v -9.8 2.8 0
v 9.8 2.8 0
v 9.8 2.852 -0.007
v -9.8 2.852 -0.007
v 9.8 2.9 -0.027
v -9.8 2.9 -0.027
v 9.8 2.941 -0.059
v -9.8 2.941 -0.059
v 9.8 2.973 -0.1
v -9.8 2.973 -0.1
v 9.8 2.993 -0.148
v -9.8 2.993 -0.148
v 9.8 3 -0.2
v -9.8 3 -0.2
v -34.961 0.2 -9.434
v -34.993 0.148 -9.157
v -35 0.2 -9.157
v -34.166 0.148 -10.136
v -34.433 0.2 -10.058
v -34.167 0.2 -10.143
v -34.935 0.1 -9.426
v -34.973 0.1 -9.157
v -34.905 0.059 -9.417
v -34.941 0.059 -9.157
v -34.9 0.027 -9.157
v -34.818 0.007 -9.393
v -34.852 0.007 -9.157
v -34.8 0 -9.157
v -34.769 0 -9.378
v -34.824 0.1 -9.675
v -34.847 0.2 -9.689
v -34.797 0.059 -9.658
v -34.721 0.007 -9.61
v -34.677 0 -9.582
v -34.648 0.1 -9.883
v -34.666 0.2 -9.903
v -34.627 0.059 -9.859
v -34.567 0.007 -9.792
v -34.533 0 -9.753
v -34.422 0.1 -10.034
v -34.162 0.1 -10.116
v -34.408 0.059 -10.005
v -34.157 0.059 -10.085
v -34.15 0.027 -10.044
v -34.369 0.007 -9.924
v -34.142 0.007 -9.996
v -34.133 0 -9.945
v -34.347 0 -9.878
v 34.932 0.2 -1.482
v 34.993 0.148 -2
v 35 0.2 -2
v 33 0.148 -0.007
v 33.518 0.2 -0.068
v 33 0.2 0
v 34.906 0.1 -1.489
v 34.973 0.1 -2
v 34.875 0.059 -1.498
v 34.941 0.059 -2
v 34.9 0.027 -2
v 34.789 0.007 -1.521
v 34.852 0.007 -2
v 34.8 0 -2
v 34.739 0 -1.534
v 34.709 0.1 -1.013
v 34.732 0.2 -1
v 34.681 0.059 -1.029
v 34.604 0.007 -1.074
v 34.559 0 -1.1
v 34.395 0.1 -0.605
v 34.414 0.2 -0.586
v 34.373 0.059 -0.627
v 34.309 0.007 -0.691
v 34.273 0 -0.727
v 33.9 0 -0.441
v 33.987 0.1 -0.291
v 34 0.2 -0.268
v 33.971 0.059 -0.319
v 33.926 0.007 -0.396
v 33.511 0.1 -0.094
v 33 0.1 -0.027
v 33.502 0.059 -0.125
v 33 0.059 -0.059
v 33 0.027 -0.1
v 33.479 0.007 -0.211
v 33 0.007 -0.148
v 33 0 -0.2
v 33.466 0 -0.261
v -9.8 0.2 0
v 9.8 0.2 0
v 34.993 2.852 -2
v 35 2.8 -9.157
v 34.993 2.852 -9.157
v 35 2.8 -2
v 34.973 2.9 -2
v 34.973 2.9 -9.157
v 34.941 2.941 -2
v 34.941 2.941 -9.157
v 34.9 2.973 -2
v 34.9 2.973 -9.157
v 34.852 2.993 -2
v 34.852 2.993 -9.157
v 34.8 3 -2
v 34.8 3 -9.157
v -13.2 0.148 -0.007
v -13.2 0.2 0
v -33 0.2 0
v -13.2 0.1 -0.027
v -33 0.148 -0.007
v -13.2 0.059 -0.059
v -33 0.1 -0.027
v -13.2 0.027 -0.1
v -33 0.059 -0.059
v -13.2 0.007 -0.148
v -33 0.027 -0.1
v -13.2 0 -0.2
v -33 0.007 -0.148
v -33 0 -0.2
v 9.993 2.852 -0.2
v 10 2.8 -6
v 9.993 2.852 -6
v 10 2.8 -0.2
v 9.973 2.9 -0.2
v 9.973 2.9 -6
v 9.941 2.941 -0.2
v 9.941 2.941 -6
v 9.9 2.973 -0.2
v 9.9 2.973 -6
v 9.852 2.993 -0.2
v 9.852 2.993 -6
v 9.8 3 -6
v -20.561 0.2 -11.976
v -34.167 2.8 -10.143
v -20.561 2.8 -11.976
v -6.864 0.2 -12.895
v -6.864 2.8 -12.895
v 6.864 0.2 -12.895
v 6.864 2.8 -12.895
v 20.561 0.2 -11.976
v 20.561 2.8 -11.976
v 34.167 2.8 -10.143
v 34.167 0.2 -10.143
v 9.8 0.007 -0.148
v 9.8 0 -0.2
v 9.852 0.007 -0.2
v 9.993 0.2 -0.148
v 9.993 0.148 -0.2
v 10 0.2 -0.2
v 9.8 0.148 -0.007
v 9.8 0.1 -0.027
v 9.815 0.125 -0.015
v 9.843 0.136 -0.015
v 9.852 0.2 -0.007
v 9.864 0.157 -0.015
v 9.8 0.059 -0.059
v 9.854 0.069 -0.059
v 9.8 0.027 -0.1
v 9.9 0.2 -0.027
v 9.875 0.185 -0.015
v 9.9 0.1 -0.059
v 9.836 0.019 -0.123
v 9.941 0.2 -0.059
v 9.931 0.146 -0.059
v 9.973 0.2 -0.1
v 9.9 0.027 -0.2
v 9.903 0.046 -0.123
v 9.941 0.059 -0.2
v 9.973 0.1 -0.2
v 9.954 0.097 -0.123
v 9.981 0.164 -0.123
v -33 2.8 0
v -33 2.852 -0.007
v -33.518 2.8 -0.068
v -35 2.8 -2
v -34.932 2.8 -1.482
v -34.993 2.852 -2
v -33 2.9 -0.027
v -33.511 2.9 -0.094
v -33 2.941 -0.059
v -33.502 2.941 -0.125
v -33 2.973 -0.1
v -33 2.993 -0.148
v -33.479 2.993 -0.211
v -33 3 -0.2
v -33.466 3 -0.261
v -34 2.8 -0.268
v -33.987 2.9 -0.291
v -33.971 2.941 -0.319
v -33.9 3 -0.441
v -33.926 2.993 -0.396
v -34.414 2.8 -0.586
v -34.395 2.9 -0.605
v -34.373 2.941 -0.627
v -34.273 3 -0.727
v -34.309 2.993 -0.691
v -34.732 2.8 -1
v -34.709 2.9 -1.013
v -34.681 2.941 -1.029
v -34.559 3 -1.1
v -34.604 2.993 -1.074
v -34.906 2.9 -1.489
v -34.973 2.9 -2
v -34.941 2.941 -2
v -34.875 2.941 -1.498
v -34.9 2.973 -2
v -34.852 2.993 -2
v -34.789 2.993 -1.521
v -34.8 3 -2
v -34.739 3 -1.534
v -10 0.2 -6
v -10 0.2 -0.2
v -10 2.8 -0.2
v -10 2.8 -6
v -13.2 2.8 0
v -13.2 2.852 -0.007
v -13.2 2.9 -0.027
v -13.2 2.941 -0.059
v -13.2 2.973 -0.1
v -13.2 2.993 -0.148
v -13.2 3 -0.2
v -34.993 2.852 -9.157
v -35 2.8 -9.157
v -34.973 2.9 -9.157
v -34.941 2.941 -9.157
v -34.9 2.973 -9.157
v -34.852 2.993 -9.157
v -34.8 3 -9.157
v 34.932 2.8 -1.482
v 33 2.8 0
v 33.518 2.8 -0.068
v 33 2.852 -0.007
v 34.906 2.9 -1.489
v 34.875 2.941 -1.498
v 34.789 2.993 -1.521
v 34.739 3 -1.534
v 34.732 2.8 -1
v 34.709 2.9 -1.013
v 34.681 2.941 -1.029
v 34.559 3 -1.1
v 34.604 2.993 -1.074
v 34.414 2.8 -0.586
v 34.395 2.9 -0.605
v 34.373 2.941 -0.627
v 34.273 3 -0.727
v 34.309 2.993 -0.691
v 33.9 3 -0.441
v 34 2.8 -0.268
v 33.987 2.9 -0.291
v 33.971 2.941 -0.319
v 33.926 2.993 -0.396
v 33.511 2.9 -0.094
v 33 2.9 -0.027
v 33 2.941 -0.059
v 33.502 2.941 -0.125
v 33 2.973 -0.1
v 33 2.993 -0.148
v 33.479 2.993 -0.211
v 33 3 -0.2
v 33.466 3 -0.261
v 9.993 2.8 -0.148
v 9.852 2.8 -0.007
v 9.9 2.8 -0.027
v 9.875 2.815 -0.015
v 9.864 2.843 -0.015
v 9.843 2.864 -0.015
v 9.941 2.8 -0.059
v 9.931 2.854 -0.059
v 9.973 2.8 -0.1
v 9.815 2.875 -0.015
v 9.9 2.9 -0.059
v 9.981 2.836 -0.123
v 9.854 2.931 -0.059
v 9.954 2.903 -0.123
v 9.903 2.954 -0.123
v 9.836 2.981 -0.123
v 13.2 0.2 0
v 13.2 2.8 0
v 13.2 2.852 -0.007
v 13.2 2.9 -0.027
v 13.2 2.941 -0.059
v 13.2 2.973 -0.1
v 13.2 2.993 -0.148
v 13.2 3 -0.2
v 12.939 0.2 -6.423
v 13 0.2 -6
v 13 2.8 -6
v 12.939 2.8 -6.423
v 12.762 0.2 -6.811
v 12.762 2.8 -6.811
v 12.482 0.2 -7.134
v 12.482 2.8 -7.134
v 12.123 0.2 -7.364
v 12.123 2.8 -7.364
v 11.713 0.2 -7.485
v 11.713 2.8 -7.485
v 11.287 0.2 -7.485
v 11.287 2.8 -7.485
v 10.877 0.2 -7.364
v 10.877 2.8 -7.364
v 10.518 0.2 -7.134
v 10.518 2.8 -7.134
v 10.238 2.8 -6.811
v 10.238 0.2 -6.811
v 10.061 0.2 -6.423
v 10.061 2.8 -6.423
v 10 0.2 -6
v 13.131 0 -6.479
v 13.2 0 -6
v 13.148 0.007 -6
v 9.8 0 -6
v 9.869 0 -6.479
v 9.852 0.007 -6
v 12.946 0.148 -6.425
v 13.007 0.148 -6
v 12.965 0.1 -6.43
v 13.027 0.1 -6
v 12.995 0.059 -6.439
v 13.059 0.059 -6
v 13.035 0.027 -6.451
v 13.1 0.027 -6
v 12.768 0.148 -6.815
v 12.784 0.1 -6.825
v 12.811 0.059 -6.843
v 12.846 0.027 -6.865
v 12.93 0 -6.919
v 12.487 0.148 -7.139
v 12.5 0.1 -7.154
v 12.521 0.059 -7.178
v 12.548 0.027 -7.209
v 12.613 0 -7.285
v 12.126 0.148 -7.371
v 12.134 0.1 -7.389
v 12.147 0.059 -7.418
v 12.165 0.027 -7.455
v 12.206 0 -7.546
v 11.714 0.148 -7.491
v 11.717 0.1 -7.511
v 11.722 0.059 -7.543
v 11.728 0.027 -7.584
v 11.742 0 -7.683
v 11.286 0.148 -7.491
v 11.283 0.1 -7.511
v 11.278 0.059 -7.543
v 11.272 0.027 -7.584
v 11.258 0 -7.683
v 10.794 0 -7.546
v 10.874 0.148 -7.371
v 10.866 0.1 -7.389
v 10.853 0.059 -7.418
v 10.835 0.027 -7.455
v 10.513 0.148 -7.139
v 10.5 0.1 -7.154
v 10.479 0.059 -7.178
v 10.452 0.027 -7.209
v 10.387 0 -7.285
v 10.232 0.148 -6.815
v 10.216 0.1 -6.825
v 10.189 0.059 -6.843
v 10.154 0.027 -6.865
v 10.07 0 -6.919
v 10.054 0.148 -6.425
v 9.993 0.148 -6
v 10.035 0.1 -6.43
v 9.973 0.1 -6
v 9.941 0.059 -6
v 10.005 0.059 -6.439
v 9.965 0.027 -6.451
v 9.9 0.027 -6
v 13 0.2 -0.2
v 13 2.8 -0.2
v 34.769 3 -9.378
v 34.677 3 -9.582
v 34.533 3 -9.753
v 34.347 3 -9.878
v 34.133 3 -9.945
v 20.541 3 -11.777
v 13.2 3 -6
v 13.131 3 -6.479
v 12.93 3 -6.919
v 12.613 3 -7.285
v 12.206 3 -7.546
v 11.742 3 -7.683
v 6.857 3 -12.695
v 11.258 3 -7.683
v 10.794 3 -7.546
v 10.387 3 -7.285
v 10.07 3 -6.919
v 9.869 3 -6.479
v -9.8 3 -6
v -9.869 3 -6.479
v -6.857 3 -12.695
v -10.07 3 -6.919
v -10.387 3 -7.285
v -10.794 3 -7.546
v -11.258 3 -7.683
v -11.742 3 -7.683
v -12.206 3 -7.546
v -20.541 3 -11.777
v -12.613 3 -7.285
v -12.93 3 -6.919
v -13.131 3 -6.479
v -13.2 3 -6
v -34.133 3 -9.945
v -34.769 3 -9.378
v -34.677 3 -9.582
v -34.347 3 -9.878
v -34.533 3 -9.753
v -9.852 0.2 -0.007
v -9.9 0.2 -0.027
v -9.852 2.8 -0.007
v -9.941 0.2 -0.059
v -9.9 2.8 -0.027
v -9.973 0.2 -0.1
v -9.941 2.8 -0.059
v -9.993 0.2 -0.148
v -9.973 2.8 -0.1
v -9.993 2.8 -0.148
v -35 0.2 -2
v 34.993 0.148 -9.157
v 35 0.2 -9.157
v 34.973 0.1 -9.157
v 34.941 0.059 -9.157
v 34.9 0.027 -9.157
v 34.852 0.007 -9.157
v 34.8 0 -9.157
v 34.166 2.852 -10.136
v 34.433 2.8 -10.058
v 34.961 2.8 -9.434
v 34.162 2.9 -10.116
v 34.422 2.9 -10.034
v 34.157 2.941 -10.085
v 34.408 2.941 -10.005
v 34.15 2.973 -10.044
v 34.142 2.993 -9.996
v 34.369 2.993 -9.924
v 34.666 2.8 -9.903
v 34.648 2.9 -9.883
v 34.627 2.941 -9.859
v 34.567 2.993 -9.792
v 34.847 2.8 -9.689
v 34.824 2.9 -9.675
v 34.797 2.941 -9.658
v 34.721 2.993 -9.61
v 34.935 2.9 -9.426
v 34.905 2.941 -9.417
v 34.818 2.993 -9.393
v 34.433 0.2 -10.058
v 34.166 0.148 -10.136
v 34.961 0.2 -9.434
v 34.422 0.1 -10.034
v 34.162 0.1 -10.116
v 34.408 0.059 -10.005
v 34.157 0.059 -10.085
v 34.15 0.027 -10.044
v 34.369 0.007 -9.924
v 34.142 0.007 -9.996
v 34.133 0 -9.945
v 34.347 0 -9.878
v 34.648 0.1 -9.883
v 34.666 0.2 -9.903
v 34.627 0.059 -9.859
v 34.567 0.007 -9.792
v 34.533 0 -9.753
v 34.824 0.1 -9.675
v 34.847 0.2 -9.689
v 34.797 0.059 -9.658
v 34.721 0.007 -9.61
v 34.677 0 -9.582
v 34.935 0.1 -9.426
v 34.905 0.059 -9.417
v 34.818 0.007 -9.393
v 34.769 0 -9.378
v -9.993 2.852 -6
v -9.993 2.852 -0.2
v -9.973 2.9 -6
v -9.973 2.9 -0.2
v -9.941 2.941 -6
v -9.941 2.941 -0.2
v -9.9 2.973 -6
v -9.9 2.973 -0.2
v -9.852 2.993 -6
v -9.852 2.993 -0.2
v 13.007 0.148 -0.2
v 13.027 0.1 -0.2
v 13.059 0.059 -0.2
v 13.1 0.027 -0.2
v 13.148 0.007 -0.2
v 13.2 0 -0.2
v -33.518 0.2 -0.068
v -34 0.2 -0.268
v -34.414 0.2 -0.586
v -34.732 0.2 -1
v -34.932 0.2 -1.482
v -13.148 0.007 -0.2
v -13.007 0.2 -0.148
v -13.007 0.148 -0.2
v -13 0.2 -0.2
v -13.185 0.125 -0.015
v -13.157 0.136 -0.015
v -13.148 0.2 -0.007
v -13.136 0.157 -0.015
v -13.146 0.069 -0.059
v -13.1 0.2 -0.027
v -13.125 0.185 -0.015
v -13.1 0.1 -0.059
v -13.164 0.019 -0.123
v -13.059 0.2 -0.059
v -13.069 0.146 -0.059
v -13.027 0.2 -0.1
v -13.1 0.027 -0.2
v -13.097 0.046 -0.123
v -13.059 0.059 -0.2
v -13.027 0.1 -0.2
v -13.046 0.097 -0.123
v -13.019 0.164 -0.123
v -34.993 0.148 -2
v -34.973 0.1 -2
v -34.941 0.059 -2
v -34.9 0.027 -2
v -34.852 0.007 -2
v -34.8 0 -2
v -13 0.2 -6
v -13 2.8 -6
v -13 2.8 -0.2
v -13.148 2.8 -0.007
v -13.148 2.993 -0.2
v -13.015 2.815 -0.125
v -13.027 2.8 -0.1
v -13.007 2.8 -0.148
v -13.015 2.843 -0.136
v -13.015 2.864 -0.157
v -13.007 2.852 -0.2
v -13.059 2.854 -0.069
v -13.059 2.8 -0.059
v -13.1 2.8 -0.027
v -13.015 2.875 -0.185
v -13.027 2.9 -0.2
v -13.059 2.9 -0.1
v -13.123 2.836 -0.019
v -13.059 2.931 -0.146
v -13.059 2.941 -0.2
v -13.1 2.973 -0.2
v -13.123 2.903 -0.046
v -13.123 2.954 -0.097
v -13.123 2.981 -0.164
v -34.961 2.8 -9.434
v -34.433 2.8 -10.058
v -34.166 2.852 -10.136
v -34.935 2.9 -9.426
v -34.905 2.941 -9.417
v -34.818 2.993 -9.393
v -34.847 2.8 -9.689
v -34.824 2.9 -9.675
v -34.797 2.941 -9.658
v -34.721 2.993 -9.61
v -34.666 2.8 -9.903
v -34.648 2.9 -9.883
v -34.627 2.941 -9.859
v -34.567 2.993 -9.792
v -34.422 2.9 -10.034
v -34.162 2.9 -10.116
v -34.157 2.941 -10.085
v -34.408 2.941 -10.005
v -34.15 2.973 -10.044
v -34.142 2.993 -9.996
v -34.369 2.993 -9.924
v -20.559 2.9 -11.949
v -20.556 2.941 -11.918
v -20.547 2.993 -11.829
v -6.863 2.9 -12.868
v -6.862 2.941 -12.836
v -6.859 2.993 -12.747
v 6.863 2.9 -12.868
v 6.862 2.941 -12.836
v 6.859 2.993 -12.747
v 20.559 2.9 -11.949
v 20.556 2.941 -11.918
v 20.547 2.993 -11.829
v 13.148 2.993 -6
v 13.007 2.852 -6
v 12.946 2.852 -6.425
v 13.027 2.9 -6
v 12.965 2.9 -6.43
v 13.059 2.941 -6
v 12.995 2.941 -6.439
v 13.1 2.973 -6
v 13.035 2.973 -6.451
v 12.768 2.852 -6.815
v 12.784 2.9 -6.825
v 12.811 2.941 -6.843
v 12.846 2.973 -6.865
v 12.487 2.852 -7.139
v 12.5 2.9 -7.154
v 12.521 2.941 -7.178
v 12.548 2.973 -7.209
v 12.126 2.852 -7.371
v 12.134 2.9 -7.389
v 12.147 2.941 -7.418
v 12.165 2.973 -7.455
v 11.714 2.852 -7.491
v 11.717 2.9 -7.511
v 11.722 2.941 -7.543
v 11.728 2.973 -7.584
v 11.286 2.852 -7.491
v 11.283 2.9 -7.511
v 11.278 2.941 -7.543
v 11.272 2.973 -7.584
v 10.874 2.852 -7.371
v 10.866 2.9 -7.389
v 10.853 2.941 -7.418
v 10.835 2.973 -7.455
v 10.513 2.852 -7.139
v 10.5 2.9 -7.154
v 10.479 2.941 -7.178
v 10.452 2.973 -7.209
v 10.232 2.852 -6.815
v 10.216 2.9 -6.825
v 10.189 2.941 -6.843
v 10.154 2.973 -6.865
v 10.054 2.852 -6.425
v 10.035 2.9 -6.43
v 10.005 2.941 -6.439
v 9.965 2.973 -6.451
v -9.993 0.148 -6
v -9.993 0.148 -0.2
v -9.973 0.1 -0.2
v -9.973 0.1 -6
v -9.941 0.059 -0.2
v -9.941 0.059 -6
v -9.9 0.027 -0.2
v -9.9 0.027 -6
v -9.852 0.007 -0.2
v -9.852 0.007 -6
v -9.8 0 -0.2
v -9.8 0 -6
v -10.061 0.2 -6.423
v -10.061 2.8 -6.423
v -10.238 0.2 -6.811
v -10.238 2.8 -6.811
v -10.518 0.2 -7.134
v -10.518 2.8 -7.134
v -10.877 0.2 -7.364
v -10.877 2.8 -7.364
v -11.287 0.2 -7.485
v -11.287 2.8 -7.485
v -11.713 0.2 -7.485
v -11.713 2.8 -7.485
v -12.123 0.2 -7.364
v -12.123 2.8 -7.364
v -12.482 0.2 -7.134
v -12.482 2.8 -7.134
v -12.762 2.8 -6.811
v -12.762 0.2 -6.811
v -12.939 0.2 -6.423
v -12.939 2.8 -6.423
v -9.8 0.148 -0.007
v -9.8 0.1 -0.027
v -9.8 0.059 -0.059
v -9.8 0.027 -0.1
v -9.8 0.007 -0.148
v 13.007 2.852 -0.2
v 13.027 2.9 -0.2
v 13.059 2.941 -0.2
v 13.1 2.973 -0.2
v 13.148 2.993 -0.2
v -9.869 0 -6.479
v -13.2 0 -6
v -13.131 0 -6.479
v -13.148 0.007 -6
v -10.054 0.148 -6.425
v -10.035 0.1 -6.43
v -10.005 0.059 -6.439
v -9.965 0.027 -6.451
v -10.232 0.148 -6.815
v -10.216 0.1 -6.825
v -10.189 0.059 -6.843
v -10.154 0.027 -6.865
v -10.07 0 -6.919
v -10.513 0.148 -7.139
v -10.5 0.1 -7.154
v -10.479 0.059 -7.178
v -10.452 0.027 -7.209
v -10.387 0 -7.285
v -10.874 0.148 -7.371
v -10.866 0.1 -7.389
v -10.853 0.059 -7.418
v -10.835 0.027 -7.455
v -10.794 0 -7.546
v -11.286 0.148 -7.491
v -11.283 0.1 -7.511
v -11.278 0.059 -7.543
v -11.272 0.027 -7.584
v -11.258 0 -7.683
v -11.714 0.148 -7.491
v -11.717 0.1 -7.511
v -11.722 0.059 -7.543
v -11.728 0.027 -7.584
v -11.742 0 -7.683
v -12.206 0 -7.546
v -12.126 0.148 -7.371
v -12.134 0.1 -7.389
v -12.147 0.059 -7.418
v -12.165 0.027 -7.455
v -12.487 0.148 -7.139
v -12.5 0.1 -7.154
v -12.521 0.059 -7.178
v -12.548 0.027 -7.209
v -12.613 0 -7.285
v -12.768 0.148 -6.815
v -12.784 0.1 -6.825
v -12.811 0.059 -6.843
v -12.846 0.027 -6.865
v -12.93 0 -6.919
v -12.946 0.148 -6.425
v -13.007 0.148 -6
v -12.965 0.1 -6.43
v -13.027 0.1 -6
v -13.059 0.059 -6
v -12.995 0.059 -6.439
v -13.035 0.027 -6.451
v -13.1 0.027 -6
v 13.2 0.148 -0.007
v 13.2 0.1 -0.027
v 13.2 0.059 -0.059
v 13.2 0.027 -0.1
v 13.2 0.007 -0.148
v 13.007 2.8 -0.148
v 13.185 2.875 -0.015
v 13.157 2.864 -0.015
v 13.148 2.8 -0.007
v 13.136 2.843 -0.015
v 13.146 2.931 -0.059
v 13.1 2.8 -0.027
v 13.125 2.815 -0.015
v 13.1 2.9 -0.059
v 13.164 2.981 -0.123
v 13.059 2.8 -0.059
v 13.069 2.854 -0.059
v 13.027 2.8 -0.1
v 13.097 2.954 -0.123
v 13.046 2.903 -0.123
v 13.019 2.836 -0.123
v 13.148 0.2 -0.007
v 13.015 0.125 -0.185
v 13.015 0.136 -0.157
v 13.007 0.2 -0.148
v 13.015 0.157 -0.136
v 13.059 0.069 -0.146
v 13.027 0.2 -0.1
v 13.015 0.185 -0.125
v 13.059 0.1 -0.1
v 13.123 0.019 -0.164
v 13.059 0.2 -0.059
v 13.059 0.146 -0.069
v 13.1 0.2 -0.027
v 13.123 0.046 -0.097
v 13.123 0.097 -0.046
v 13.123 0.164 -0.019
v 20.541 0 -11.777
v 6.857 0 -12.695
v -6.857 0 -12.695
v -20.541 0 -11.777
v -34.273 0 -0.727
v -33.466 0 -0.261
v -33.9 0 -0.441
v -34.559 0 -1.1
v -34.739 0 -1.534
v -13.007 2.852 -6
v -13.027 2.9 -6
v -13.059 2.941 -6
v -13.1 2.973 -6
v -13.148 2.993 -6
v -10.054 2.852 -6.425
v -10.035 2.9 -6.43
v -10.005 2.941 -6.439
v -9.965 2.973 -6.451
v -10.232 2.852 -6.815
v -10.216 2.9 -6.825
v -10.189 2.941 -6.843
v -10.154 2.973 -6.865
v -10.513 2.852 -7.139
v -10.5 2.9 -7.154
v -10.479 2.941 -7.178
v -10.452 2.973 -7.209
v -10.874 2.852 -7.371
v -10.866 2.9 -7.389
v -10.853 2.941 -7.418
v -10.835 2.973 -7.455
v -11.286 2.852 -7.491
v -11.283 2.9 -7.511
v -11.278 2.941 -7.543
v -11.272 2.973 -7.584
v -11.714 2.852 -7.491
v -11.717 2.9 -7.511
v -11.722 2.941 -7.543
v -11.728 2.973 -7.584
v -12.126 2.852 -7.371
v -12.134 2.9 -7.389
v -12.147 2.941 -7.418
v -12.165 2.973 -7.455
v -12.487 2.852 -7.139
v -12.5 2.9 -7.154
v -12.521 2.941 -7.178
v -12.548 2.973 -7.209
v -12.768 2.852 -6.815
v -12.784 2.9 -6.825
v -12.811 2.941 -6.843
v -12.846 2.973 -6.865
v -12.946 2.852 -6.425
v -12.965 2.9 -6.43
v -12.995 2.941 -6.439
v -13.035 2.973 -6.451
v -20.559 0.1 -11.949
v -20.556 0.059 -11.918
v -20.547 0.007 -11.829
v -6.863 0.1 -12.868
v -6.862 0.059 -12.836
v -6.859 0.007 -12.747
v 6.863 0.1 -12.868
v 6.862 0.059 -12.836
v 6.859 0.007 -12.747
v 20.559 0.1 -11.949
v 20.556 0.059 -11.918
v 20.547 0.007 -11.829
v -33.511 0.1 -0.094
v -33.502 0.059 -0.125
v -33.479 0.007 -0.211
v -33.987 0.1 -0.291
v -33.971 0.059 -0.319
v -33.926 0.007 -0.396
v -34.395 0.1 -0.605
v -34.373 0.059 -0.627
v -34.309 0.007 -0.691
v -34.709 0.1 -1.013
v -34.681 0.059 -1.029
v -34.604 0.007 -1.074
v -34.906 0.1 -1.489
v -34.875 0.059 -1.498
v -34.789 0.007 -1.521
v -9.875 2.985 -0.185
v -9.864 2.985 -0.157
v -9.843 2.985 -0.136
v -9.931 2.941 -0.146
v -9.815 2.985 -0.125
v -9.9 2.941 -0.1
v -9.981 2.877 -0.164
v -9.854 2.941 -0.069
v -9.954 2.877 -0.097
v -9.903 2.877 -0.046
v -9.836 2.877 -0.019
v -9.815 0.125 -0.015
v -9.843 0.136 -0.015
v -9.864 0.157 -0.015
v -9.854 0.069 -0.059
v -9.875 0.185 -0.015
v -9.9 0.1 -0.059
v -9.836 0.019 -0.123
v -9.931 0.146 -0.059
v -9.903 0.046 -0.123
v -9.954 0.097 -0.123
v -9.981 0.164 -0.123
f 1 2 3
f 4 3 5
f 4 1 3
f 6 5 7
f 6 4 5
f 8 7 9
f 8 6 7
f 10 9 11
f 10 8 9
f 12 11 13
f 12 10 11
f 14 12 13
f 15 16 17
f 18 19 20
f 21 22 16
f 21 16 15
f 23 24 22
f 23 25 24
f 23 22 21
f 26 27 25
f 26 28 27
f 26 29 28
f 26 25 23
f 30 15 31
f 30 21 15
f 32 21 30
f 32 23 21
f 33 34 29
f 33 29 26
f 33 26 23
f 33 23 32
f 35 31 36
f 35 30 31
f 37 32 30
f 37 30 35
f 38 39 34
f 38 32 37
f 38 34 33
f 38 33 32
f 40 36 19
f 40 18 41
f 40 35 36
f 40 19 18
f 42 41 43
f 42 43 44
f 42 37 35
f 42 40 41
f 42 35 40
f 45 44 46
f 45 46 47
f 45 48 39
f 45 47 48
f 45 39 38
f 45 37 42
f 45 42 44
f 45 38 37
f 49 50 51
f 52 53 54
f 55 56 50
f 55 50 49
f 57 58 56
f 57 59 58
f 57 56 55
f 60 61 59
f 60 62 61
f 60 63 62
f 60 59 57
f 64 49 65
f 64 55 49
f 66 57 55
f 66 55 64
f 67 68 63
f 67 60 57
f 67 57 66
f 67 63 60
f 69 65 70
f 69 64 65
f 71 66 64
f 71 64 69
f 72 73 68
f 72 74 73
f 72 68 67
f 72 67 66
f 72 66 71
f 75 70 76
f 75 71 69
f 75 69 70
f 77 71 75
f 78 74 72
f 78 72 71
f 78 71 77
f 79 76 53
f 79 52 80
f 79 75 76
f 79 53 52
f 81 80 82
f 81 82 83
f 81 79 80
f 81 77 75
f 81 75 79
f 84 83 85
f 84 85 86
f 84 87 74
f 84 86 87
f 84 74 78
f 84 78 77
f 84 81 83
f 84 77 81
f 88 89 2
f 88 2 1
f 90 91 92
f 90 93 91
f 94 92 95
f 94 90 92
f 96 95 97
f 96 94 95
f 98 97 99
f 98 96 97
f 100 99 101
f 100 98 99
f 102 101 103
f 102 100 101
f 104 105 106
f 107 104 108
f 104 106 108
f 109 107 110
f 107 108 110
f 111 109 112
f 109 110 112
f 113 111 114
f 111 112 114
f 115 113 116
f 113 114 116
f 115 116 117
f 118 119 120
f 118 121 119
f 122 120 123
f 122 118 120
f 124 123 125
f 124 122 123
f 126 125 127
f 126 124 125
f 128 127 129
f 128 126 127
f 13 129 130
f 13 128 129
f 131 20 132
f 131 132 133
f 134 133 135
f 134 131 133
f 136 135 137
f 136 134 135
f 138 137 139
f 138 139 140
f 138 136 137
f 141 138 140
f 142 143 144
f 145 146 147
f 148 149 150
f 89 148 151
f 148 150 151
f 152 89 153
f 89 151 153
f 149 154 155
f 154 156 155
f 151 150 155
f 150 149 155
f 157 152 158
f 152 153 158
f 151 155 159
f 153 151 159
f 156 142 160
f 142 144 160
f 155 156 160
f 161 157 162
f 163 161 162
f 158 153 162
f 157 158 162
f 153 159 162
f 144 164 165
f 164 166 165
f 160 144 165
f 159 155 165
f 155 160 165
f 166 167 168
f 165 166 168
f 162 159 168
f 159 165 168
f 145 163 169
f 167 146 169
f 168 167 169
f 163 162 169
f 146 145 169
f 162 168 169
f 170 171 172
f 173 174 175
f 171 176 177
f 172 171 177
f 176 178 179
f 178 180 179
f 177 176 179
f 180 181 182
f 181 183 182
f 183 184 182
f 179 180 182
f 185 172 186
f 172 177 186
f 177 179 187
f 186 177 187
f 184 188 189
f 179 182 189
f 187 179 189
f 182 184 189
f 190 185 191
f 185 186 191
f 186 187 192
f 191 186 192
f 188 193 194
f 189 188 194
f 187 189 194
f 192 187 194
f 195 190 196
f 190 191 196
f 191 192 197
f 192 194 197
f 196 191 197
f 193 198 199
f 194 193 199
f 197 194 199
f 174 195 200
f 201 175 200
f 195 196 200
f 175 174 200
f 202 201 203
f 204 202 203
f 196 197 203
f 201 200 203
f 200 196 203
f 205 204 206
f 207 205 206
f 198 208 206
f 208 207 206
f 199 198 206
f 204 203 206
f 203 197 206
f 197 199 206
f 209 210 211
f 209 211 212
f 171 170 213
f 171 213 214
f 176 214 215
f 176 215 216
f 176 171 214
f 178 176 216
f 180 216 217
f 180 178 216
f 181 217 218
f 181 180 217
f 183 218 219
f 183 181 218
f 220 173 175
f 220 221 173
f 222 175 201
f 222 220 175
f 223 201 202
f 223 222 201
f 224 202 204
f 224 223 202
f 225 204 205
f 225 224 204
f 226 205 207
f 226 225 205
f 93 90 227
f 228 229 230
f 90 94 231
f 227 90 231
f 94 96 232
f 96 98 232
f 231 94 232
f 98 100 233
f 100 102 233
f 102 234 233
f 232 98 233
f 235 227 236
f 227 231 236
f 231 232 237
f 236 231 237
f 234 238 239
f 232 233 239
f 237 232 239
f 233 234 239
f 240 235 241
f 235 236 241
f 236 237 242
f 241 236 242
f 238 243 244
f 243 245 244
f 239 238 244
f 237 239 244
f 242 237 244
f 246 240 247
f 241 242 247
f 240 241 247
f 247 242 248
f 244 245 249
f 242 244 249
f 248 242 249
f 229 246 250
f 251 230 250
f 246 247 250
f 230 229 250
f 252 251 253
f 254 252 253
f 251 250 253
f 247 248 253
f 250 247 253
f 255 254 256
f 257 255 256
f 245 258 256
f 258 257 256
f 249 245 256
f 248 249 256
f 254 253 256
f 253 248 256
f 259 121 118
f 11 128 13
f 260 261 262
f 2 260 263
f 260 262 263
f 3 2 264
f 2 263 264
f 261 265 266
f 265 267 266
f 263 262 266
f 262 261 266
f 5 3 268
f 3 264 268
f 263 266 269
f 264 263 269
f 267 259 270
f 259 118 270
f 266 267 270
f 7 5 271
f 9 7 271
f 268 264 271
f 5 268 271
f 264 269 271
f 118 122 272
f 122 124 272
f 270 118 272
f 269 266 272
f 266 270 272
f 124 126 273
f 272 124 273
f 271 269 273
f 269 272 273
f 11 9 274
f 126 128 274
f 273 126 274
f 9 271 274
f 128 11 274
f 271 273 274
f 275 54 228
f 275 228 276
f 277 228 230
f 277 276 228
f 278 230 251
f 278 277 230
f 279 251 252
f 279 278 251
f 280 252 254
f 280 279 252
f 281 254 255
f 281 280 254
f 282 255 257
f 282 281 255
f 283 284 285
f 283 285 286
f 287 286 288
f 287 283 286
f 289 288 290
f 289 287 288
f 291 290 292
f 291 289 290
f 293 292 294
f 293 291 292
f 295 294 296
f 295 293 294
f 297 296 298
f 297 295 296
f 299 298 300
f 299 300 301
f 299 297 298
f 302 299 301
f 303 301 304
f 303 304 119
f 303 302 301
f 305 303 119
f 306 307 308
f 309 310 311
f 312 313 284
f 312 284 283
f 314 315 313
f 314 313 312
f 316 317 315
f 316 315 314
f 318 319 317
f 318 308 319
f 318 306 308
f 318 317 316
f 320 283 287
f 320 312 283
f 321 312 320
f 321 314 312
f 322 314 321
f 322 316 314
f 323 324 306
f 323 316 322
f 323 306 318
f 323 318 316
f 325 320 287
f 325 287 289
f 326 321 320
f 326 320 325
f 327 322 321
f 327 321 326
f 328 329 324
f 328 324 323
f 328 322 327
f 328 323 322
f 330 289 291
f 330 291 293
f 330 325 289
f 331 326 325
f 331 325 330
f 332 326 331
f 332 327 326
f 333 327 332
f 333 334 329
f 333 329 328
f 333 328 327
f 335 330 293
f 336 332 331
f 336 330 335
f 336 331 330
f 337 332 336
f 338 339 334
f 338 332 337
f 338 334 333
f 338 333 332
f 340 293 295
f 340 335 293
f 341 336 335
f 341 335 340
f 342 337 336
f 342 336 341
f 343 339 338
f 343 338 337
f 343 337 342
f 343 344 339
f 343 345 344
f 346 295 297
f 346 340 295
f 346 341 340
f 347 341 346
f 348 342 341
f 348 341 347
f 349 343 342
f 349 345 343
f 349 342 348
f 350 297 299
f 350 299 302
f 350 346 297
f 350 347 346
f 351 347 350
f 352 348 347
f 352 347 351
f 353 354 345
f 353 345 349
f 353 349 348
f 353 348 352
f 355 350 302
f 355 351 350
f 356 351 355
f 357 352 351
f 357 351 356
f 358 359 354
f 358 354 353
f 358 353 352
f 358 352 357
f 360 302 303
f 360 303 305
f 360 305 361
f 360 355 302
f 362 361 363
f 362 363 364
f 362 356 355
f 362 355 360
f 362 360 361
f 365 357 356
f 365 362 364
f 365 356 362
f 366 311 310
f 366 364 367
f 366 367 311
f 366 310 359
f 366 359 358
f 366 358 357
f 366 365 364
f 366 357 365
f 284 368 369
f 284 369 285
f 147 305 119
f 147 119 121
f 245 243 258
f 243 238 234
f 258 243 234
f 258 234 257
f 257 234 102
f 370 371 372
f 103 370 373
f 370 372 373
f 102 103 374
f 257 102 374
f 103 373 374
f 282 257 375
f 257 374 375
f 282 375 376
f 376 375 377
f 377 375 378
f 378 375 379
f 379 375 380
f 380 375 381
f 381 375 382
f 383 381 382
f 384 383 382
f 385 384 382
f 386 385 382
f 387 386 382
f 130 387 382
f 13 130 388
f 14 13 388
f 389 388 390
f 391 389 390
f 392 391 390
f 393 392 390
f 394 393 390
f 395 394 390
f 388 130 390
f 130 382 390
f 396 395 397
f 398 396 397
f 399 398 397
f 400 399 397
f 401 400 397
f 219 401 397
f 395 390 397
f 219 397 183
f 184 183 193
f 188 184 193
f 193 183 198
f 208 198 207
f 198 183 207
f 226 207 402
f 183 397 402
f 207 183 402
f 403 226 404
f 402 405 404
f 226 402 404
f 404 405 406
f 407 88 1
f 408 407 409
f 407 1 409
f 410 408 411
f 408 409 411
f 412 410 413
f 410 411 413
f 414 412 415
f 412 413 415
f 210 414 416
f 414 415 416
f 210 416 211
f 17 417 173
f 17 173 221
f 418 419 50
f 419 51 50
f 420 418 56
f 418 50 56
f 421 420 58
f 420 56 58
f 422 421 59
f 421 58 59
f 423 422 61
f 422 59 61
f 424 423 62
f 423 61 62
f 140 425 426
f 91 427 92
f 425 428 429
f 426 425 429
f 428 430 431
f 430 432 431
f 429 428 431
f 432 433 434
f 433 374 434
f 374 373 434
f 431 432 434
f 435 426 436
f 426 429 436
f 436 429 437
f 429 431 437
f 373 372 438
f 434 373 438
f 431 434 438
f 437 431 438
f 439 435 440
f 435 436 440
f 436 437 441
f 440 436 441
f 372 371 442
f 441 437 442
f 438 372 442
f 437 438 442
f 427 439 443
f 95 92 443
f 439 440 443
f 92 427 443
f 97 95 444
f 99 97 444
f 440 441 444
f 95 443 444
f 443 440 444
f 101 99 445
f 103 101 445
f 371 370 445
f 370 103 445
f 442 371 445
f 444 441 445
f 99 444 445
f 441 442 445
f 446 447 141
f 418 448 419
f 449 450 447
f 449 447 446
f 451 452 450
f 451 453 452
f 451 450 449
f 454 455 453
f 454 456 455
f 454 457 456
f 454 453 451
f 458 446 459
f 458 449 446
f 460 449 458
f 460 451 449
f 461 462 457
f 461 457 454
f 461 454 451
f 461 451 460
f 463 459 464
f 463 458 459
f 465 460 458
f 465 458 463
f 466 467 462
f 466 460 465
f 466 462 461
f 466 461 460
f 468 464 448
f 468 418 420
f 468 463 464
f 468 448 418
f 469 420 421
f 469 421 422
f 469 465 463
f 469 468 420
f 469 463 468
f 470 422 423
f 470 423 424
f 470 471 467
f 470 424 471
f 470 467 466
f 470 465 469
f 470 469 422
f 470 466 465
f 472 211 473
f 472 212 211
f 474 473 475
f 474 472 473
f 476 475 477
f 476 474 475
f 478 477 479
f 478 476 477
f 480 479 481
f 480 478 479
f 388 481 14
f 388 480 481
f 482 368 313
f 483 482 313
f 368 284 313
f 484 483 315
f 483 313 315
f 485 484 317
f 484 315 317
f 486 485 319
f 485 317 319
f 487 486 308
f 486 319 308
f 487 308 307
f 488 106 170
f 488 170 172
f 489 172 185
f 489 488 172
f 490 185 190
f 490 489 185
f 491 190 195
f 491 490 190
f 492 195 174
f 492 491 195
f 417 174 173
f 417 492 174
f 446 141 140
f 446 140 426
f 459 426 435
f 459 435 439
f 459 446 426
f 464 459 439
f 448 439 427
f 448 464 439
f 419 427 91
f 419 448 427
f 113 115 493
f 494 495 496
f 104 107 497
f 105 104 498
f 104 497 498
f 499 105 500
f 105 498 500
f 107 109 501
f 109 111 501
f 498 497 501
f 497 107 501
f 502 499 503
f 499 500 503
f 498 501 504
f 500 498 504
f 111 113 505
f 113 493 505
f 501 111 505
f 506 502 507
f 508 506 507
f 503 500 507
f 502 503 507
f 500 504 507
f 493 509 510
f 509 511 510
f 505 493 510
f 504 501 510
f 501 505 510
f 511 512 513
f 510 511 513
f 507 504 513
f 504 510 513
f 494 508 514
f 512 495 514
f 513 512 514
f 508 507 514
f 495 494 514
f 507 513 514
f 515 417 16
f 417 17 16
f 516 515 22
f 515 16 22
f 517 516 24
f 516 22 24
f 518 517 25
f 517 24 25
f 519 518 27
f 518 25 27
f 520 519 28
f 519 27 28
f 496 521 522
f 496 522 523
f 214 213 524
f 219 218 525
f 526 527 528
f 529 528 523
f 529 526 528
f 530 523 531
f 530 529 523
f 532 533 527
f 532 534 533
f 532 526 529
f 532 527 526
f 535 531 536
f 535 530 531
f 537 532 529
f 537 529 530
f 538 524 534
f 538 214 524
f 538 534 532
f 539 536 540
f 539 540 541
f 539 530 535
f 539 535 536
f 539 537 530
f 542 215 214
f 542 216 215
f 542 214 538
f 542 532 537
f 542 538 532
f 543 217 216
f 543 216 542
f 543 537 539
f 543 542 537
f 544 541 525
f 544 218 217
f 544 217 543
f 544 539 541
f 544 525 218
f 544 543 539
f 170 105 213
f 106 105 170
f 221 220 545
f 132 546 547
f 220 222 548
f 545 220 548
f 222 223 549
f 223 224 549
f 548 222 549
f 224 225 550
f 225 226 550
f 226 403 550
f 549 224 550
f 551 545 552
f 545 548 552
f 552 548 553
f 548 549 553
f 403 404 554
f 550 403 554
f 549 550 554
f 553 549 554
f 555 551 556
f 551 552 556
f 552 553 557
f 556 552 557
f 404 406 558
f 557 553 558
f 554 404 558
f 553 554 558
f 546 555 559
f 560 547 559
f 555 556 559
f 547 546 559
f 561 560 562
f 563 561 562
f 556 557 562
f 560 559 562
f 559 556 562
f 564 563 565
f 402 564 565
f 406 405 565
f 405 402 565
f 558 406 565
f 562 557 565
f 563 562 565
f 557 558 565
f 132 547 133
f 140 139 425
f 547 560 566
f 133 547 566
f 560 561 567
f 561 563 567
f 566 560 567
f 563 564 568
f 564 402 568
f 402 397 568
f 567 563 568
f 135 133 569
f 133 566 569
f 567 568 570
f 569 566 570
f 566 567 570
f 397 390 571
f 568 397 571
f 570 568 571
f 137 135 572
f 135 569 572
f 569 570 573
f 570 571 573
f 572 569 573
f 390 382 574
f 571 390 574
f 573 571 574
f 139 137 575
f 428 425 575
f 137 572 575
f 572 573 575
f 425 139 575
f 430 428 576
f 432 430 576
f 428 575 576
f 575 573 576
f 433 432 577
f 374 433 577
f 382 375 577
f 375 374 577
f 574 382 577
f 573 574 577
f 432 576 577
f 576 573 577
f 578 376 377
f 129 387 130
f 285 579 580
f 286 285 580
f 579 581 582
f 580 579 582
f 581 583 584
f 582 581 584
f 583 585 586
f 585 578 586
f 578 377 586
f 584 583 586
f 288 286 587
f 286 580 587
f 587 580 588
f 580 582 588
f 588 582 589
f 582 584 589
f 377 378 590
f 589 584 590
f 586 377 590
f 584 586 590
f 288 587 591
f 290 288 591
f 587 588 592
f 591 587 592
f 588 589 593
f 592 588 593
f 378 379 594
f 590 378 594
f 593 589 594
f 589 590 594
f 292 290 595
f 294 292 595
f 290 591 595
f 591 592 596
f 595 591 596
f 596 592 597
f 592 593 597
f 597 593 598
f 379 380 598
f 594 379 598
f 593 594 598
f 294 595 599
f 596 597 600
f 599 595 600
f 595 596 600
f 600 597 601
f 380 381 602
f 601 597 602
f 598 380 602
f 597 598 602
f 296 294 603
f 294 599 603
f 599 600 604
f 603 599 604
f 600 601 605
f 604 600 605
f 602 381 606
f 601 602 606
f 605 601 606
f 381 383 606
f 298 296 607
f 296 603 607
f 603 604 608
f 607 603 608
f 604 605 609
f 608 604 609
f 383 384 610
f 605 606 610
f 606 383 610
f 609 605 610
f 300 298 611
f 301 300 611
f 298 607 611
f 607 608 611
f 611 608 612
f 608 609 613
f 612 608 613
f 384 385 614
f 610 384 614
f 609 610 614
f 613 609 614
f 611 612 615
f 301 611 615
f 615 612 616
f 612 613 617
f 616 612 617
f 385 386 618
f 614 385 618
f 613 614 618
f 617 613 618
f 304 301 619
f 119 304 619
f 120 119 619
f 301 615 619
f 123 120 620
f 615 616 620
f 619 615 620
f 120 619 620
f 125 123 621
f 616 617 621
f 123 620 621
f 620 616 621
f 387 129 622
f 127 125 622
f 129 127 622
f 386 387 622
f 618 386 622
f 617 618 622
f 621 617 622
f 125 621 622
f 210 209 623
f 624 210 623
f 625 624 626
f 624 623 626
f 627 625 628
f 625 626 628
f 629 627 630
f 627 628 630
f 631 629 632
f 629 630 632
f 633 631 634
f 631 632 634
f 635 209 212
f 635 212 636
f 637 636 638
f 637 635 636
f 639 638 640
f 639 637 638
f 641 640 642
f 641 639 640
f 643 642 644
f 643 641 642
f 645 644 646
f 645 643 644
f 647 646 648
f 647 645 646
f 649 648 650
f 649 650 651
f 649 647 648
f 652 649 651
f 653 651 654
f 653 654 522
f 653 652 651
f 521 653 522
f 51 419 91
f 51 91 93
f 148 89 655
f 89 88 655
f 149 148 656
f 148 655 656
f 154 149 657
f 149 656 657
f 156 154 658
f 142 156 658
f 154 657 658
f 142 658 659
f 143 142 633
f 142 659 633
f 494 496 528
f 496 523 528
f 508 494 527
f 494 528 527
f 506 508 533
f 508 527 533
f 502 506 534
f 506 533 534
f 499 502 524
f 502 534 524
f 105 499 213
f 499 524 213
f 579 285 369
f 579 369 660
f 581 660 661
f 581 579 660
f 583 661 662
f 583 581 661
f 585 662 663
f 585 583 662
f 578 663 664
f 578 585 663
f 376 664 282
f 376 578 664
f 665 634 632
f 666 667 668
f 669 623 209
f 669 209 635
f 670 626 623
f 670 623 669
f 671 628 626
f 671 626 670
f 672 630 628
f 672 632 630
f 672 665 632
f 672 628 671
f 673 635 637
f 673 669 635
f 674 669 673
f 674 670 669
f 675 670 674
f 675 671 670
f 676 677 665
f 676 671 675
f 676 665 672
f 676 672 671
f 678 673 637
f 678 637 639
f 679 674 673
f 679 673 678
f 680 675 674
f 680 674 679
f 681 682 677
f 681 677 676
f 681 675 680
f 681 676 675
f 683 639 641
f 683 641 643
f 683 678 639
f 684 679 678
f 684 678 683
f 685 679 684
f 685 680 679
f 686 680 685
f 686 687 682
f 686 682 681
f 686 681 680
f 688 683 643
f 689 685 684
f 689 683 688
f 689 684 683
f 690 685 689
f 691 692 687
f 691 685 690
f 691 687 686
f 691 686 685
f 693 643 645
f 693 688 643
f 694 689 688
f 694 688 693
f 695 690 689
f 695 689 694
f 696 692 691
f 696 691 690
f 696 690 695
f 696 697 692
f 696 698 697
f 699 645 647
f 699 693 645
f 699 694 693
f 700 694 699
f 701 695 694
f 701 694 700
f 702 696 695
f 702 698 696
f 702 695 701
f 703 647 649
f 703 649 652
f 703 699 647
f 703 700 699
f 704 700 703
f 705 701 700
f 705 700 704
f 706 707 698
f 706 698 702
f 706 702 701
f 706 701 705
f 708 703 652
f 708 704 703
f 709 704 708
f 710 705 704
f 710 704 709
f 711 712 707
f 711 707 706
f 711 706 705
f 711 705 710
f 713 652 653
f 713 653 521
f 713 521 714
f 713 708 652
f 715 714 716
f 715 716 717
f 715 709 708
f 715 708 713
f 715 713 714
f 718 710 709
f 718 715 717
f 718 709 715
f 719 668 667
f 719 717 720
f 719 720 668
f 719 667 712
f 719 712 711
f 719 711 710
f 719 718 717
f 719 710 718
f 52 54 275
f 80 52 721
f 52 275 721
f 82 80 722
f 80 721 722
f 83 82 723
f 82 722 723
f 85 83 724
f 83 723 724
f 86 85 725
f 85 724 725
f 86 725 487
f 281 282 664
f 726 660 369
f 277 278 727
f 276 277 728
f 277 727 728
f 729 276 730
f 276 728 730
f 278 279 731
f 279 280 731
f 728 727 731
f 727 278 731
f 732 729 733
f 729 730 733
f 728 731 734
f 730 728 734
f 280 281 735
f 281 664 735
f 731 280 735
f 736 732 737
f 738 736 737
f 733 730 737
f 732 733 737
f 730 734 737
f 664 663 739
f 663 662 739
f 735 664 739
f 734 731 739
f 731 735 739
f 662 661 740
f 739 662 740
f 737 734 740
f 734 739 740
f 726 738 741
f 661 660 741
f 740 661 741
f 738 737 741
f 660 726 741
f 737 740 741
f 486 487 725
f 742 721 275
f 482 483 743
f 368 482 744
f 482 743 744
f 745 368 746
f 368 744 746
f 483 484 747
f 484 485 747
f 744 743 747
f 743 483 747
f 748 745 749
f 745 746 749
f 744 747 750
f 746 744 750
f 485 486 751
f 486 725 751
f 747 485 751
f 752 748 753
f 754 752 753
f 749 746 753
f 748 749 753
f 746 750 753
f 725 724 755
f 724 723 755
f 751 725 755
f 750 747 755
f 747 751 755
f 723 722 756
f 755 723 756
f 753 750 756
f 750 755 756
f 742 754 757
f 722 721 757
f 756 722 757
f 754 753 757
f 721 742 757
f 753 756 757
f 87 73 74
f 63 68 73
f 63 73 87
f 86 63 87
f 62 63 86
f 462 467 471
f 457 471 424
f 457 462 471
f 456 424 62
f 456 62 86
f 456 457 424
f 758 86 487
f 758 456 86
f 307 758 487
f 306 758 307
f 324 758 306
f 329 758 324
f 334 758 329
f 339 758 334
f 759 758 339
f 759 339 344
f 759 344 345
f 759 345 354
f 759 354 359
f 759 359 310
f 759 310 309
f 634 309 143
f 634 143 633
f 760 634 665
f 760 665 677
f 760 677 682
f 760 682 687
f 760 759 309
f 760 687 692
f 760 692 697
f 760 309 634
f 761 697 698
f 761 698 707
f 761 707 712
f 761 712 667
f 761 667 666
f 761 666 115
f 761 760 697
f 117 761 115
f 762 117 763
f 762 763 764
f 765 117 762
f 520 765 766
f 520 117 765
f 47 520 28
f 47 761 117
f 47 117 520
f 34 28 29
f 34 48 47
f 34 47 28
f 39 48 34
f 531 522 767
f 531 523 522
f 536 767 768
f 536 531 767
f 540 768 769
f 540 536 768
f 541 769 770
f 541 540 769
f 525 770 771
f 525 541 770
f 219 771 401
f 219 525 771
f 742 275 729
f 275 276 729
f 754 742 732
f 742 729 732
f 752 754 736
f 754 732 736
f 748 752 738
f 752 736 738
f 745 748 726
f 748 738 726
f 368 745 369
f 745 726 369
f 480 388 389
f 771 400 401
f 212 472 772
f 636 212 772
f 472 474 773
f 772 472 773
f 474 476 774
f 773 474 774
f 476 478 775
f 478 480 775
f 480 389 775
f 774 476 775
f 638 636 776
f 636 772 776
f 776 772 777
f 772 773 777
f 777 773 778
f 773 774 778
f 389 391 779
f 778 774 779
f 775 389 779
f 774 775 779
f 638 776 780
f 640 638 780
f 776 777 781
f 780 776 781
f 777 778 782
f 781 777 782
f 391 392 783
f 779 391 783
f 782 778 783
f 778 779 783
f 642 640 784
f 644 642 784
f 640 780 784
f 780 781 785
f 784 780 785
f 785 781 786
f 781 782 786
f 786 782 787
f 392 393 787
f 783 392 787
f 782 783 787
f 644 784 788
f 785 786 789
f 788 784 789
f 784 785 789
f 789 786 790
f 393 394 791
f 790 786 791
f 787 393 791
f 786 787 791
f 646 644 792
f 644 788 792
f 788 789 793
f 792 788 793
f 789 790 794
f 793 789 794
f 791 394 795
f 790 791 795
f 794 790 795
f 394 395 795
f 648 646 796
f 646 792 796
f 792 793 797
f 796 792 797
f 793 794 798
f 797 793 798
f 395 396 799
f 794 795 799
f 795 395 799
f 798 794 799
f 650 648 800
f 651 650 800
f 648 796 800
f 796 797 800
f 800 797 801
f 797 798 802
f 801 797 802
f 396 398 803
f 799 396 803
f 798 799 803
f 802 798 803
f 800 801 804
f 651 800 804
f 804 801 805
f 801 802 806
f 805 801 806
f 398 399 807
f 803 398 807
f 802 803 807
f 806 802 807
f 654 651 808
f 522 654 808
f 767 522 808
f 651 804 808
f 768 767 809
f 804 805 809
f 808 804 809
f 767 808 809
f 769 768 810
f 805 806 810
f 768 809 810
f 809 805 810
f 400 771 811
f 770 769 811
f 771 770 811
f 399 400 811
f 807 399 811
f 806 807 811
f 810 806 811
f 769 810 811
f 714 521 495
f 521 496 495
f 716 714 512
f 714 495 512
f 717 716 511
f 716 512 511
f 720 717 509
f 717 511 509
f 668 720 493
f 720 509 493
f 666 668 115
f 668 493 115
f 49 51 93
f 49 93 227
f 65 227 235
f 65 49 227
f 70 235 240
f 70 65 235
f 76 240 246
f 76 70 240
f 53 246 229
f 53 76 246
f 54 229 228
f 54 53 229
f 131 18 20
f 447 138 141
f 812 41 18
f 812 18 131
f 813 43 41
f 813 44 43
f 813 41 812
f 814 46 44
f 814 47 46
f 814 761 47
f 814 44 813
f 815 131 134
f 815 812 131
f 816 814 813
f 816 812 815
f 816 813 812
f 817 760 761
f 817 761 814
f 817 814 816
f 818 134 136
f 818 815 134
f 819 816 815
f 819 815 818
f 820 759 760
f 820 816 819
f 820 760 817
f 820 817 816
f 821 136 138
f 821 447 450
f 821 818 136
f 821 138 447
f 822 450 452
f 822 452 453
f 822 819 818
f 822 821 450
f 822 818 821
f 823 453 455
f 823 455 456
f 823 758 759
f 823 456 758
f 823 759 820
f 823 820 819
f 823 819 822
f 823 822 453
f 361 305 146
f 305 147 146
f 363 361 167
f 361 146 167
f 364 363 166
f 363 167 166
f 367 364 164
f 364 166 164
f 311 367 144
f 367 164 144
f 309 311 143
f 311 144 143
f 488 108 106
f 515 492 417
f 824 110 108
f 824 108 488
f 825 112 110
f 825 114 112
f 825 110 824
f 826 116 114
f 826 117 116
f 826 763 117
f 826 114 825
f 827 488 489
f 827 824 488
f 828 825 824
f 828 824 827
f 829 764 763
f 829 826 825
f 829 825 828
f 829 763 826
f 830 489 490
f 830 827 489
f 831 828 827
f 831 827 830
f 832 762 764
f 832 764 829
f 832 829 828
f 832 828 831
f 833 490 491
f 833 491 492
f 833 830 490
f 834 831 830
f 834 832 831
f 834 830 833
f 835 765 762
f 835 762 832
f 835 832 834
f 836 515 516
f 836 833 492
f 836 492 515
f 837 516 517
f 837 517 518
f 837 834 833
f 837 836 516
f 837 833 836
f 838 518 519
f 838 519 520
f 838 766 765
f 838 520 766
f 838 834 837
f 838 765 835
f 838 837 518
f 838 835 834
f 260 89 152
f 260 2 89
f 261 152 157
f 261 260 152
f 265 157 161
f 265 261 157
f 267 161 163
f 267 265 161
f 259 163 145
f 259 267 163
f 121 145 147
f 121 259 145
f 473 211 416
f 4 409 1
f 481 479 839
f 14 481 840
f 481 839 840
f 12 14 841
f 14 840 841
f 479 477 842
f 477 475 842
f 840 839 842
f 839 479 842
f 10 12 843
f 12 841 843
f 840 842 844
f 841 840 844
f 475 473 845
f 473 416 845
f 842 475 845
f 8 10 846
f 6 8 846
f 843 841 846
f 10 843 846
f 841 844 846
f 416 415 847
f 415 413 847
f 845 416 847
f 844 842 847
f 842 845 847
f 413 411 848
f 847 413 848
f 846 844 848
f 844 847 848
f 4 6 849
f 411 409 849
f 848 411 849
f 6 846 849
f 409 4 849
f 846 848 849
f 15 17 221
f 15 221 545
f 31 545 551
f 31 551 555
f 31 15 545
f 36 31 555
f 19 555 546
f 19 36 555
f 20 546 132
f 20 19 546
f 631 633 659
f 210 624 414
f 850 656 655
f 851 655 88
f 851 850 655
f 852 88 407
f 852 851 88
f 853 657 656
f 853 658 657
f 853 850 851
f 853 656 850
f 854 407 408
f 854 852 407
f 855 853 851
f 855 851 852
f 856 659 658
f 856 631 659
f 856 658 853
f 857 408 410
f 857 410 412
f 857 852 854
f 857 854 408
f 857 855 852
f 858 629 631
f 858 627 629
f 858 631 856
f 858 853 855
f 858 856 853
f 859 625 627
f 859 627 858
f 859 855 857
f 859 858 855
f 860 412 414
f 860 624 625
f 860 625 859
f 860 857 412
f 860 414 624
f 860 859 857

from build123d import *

# Parameters (mm, degrees)
BOSS_EXTRUDE1_DEPTH = 3
FILLET1_R           = 0.2


with BuildPart() as part:
    # Sketch1 → Boss-Extrude1 (new body)
    with BuildSketch(Plane(origin=(0, 0, 0), x_dir=(1, 0, 0), z_dir=(0, 1, 0))):
        with BuildLine():
            Line((10, 0), (-10, 0))
            Line((-10, 0), (-10, 6))
            ThreePointArc((-10, 6), (-11.5, 7.5), (-13, 6))
            Line((-13, 6), (-13, 0))
            Line((-13, 0), (-33, 0))
            ThreePointArc((-33, 0), (-34.414213562, 0.585786438), (-35, 2))
            Line((-35, 2), (-35, 9.156613858))
            ThreePointArc((-35, 9.156613858), (-34.763762616, 9.802111083), (-34.166666667, 10.142627155))
            ThreePointArc((-34.166666667, 10.142627155), (0, 13.009901233), (34.166666667, 10.142627155))
            ThreePointArc((34.166666667, 10.142627155), (34.763762616, 9.802111083), (35, 9.156613858))
            Line((35, 9.156613858), (35, 2))
            ThreePointArc((35, 2), (34.414213562, 0.585786438), (33, 0))
            Line((33, 0), (13, 0))
            Line((13, 0), (13, 6))
            ThreePointArc((13, 6), (11.5, 7.5), (10, 6))
            Line((10, 6), (10, 0))
        make_face()
    extrude(amount=BOSS_EXTRUDE1_DEPTH)

    # Fillet1
    fillet1_edges = [part.edges().sort_by_distance(p)[0] for p in [
        (10, 3, -3),
        (11.5, 3, -7.5),
        (-11.5, 0, -7.5),
        (-13, 0, -3),
        (-23, 0, 0),
        (-34.414213562, 0, -0.585786438),
        (-35, 0, -5.578306929),
        (13, 3, -3),
        (-34.763762616, 0, -9.802111083),
        (0, 0, -13.009901233),
        (34.763762616, 0, -9.802111083),
        (35, 0, -5.578306929),
        (34.414213562, 0, -0.585786438),
        (23, 0, 0),
        (13, 0, -3),
        (11.5, 0, -7.5),
        (23, 3, 0),
        (10, 0, -3),
        (0, 0, 0),
        (-10, 0, -3),
        (34.414213562, 3, -0.585786438),
        (35, 3, -5.578306929),
        (-13, 1.5, 0),
        (13, 1.5, 0),
        (10, 1.5, 0),
        (-10, 1.5, 0),
        (34.763762616, 3, -9.802111083),
        (0, 3, -13.009901233),
        (-34.763762616, 3, -9.802111083),
        (-35, 3, -5.578306929),
        (-10, 3, -3),
        (-34.414213562, 3, -0.585786438),
        (-23, 3, 0),
        (-13, 3, -3),
        (-11.5, 3, -7.5),
        (0, 3, 0),
    ]]
    fillet(fillet1_edges, radius=FILLET1_R)


solid = part.part
